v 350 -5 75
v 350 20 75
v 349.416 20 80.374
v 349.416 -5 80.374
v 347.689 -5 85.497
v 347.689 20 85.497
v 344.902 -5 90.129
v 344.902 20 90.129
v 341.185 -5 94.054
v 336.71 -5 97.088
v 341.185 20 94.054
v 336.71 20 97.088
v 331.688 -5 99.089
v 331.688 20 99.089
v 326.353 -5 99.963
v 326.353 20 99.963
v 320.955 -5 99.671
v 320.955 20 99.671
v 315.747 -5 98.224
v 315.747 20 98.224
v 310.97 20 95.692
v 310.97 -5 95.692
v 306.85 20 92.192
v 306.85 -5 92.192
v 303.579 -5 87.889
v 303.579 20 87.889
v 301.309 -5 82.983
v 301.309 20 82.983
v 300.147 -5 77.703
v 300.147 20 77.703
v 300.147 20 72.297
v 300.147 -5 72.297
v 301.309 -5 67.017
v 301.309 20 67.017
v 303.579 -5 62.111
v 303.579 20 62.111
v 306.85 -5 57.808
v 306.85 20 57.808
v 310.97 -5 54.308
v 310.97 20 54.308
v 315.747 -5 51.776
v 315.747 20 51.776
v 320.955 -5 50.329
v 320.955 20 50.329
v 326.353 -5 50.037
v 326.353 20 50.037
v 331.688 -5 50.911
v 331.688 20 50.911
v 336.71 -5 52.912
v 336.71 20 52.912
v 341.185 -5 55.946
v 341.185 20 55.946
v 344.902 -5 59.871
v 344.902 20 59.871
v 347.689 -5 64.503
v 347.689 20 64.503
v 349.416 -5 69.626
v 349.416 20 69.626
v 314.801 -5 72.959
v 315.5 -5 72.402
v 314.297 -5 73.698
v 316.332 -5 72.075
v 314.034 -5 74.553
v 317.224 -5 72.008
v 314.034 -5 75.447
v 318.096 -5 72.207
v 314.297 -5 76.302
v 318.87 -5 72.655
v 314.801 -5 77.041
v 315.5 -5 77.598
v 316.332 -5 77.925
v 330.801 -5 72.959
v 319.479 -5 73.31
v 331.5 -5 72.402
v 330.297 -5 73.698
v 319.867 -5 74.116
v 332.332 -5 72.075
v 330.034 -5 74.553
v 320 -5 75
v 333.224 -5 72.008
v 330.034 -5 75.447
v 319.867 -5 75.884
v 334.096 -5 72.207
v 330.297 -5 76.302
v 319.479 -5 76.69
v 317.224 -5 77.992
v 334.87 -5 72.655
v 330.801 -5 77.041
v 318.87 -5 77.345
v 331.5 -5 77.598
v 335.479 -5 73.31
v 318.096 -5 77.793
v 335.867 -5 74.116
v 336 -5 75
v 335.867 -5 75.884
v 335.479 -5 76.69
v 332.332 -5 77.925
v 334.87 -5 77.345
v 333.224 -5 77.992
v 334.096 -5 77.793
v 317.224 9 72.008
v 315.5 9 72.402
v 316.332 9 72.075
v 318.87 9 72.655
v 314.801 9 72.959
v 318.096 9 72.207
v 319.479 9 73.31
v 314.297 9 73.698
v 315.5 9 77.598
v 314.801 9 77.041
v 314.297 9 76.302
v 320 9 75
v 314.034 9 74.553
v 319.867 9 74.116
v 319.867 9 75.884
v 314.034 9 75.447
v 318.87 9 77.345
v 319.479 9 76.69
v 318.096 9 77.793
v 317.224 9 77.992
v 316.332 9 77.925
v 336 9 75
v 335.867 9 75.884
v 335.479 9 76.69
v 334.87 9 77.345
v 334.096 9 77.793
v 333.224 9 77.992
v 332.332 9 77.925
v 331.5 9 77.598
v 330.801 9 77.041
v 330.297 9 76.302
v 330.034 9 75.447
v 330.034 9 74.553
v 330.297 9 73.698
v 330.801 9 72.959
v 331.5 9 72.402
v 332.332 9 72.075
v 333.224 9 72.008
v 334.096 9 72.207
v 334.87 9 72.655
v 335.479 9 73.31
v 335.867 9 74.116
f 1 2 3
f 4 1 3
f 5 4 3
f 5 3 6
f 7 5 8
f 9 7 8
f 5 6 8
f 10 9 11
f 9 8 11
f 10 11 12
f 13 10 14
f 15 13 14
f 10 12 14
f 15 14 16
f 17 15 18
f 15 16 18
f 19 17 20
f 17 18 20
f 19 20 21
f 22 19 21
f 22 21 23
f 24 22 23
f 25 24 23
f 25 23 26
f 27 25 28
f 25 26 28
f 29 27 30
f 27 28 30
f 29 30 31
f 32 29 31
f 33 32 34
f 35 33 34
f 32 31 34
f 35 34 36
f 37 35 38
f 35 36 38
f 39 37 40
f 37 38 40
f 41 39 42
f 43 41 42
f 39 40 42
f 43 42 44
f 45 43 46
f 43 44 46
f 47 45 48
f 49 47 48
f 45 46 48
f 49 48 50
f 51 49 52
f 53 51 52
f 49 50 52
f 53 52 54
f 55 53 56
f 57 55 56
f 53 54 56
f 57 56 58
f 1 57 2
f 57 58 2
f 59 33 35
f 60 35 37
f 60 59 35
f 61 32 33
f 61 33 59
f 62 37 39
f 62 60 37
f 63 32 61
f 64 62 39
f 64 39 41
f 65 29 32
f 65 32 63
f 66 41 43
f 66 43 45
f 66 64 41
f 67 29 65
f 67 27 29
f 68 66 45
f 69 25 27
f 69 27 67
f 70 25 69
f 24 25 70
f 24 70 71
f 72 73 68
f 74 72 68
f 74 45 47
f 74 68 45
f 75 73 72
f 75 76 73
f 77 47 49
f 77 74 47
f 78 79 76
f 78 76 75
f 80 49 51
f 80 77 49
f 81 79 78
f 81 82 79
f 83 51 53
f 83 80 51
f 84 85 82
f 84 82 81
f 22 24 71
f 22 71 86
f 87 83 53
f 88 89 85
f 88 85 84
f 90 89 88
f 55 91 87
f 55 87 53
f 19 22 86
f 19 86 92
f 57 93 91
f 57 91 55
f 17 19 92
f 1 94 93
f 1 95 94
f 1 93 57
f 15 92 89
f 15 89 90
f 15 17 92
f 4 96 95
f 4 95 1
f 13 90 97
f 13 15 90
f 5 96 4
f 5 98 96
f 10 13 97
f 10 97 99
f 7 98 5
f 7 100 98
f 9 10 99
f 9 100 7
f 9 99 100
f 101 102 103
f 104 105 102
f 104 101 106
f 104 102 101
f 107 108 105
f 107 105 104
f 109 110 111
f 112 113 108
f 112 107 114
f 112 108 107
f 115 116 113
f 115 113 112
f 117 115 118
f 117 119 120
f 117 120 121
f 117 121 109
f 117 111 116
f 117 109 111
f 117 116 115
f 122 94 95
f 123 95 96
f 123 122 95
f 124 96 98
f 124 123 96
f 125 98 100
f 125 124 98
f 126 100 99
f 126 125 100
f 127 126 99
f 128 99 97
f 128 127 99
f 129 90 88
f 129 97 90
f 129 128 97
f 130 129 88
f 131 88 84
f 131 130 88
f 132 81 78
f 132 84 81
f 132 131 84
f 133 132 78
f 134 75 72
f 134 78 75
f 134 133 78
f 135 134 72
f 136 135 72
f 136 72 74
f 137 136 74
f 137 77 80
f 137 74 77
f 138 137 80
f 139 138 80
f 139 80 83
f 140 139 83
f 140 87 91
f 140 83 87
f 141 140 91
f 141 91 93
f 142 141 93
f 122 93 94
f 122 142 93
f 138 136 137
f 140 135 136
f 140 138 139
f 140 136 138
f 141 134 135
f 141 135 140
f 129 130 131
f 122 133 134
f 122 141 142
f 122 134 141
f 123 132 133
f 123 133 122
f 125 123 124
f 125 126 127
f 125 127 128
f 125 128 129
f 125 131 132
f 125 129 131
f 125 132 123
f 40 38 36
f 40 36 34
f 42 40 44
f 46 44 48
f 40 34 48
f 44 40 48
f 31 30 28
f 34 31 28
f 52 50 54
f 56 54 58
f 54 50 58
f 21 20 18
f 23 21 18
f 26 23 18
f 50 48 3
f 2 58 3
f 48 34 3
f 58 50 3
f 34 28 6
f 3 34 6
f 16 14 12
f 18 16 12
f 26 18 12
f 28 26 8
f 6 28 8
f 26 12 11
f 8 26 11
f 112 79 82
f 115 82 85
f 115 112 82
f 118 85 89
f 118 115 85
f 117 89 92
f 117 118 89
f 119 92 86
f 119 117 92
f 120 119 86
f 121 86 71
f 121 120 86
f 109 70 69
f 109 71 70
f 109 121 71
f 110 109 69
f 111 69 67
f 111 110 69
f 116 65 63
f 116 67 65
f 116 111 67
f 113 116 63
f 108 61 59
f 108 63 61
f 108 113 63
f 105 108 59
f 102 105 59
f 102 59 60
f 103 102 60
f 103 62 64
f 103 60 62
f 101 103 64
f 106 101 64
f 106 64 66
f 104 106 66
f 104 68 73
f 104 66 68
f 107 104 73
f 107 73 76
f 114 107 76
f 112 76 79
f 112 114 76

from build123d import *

# Parameters (mm, degrees)
CYLINDER014_R          = 3
CYLINDER014_DEPTH      = 15
CYLINDER014_ROLL_ANGLE = 90
CYLINDER013_R          = 3
CYLINDER013_DEPTH      = 15
CYLINDER013_ROLL_ANGLE = 90
CYLINDER012_R          = 25
CYLINDER012_DEPTH      = 25
CYLINDER012_ROLL_ANGLE = 90


with BuildPart() as cylinder014:
    # Cylinder014 → Cylinder014 (new body)
    with BuildSketch(Plane.XY):
        Circle(CYLINDER014_R)
    extrude(amount=CYLINDER014_DEPTH)


with BuildPart() as cylinder014_1:
    # Cylinder014 roll: moved
    add(cylinder014.part.rotate(Axis((0, 0, 0), (1, 0, 0)), CYLINDER014_ROLL_ANGLE))


with BuildPart() as cylinder014_2:
    # Cylinder014 placement: moved
    add(cylinder014_1.part.moved(Location((258, 9, 130))))


with BuildPart() as cylinder013:
    # Cylinder013 → Cylinder013 (new body)
    with BuildSketch(Plane.XY):
        Circle(CYLINDER013_R)
    extrude(amount=CYLINDER013_DEPTH)


with BuildPart() as cylinder013_1:
    # Cylinder013 roll: moved
    add(cylinder013.part.rotate(Axis((0, 0, 0), (1, 0, 0)), CYLINDER013_ROLL_ANGLE))


with BuildPart() as cylinder013_2:
    # Cylinder013 placement: moved
    add(cylinder013_1.part.moved(Location((242, 9, 130))))


with BuildPart() as cut007:
    # Cylinder012 → Cylinder012 (new body)
    with BuildSketch(Plane.XY):
        Circle(CYLINDER012_R)
    extrude(amount=CYLINDER012_DEPTH)


with BuildPart() as cut007_1:
    # Cylinder012 roll: moved
    add(cut007.part.rotate(Axis((0, 0, 0), (1, 0, 0)), CYLINDER012_ROLL_ANGLE))


with BuildPart() as cut007_2:
    # Cylinder012 placement: moved
    add(cut007_1.part.moved(Location((250, 20, 130))))

    # Cut006: cut Cylinder013
    add(cylinder013_2.part, mode=Mode.SUBTRACT)

    # Cut007: cut Cylinder014
    add(cylinder014_2.part, mode=Mode.SUBTRACT)


with BuildPart() as cut007_3:
    # Cut007 placement: moved
    add(cut007_2.part.moved(Location((75, 0, -55))))


solid = cut007_3.part
